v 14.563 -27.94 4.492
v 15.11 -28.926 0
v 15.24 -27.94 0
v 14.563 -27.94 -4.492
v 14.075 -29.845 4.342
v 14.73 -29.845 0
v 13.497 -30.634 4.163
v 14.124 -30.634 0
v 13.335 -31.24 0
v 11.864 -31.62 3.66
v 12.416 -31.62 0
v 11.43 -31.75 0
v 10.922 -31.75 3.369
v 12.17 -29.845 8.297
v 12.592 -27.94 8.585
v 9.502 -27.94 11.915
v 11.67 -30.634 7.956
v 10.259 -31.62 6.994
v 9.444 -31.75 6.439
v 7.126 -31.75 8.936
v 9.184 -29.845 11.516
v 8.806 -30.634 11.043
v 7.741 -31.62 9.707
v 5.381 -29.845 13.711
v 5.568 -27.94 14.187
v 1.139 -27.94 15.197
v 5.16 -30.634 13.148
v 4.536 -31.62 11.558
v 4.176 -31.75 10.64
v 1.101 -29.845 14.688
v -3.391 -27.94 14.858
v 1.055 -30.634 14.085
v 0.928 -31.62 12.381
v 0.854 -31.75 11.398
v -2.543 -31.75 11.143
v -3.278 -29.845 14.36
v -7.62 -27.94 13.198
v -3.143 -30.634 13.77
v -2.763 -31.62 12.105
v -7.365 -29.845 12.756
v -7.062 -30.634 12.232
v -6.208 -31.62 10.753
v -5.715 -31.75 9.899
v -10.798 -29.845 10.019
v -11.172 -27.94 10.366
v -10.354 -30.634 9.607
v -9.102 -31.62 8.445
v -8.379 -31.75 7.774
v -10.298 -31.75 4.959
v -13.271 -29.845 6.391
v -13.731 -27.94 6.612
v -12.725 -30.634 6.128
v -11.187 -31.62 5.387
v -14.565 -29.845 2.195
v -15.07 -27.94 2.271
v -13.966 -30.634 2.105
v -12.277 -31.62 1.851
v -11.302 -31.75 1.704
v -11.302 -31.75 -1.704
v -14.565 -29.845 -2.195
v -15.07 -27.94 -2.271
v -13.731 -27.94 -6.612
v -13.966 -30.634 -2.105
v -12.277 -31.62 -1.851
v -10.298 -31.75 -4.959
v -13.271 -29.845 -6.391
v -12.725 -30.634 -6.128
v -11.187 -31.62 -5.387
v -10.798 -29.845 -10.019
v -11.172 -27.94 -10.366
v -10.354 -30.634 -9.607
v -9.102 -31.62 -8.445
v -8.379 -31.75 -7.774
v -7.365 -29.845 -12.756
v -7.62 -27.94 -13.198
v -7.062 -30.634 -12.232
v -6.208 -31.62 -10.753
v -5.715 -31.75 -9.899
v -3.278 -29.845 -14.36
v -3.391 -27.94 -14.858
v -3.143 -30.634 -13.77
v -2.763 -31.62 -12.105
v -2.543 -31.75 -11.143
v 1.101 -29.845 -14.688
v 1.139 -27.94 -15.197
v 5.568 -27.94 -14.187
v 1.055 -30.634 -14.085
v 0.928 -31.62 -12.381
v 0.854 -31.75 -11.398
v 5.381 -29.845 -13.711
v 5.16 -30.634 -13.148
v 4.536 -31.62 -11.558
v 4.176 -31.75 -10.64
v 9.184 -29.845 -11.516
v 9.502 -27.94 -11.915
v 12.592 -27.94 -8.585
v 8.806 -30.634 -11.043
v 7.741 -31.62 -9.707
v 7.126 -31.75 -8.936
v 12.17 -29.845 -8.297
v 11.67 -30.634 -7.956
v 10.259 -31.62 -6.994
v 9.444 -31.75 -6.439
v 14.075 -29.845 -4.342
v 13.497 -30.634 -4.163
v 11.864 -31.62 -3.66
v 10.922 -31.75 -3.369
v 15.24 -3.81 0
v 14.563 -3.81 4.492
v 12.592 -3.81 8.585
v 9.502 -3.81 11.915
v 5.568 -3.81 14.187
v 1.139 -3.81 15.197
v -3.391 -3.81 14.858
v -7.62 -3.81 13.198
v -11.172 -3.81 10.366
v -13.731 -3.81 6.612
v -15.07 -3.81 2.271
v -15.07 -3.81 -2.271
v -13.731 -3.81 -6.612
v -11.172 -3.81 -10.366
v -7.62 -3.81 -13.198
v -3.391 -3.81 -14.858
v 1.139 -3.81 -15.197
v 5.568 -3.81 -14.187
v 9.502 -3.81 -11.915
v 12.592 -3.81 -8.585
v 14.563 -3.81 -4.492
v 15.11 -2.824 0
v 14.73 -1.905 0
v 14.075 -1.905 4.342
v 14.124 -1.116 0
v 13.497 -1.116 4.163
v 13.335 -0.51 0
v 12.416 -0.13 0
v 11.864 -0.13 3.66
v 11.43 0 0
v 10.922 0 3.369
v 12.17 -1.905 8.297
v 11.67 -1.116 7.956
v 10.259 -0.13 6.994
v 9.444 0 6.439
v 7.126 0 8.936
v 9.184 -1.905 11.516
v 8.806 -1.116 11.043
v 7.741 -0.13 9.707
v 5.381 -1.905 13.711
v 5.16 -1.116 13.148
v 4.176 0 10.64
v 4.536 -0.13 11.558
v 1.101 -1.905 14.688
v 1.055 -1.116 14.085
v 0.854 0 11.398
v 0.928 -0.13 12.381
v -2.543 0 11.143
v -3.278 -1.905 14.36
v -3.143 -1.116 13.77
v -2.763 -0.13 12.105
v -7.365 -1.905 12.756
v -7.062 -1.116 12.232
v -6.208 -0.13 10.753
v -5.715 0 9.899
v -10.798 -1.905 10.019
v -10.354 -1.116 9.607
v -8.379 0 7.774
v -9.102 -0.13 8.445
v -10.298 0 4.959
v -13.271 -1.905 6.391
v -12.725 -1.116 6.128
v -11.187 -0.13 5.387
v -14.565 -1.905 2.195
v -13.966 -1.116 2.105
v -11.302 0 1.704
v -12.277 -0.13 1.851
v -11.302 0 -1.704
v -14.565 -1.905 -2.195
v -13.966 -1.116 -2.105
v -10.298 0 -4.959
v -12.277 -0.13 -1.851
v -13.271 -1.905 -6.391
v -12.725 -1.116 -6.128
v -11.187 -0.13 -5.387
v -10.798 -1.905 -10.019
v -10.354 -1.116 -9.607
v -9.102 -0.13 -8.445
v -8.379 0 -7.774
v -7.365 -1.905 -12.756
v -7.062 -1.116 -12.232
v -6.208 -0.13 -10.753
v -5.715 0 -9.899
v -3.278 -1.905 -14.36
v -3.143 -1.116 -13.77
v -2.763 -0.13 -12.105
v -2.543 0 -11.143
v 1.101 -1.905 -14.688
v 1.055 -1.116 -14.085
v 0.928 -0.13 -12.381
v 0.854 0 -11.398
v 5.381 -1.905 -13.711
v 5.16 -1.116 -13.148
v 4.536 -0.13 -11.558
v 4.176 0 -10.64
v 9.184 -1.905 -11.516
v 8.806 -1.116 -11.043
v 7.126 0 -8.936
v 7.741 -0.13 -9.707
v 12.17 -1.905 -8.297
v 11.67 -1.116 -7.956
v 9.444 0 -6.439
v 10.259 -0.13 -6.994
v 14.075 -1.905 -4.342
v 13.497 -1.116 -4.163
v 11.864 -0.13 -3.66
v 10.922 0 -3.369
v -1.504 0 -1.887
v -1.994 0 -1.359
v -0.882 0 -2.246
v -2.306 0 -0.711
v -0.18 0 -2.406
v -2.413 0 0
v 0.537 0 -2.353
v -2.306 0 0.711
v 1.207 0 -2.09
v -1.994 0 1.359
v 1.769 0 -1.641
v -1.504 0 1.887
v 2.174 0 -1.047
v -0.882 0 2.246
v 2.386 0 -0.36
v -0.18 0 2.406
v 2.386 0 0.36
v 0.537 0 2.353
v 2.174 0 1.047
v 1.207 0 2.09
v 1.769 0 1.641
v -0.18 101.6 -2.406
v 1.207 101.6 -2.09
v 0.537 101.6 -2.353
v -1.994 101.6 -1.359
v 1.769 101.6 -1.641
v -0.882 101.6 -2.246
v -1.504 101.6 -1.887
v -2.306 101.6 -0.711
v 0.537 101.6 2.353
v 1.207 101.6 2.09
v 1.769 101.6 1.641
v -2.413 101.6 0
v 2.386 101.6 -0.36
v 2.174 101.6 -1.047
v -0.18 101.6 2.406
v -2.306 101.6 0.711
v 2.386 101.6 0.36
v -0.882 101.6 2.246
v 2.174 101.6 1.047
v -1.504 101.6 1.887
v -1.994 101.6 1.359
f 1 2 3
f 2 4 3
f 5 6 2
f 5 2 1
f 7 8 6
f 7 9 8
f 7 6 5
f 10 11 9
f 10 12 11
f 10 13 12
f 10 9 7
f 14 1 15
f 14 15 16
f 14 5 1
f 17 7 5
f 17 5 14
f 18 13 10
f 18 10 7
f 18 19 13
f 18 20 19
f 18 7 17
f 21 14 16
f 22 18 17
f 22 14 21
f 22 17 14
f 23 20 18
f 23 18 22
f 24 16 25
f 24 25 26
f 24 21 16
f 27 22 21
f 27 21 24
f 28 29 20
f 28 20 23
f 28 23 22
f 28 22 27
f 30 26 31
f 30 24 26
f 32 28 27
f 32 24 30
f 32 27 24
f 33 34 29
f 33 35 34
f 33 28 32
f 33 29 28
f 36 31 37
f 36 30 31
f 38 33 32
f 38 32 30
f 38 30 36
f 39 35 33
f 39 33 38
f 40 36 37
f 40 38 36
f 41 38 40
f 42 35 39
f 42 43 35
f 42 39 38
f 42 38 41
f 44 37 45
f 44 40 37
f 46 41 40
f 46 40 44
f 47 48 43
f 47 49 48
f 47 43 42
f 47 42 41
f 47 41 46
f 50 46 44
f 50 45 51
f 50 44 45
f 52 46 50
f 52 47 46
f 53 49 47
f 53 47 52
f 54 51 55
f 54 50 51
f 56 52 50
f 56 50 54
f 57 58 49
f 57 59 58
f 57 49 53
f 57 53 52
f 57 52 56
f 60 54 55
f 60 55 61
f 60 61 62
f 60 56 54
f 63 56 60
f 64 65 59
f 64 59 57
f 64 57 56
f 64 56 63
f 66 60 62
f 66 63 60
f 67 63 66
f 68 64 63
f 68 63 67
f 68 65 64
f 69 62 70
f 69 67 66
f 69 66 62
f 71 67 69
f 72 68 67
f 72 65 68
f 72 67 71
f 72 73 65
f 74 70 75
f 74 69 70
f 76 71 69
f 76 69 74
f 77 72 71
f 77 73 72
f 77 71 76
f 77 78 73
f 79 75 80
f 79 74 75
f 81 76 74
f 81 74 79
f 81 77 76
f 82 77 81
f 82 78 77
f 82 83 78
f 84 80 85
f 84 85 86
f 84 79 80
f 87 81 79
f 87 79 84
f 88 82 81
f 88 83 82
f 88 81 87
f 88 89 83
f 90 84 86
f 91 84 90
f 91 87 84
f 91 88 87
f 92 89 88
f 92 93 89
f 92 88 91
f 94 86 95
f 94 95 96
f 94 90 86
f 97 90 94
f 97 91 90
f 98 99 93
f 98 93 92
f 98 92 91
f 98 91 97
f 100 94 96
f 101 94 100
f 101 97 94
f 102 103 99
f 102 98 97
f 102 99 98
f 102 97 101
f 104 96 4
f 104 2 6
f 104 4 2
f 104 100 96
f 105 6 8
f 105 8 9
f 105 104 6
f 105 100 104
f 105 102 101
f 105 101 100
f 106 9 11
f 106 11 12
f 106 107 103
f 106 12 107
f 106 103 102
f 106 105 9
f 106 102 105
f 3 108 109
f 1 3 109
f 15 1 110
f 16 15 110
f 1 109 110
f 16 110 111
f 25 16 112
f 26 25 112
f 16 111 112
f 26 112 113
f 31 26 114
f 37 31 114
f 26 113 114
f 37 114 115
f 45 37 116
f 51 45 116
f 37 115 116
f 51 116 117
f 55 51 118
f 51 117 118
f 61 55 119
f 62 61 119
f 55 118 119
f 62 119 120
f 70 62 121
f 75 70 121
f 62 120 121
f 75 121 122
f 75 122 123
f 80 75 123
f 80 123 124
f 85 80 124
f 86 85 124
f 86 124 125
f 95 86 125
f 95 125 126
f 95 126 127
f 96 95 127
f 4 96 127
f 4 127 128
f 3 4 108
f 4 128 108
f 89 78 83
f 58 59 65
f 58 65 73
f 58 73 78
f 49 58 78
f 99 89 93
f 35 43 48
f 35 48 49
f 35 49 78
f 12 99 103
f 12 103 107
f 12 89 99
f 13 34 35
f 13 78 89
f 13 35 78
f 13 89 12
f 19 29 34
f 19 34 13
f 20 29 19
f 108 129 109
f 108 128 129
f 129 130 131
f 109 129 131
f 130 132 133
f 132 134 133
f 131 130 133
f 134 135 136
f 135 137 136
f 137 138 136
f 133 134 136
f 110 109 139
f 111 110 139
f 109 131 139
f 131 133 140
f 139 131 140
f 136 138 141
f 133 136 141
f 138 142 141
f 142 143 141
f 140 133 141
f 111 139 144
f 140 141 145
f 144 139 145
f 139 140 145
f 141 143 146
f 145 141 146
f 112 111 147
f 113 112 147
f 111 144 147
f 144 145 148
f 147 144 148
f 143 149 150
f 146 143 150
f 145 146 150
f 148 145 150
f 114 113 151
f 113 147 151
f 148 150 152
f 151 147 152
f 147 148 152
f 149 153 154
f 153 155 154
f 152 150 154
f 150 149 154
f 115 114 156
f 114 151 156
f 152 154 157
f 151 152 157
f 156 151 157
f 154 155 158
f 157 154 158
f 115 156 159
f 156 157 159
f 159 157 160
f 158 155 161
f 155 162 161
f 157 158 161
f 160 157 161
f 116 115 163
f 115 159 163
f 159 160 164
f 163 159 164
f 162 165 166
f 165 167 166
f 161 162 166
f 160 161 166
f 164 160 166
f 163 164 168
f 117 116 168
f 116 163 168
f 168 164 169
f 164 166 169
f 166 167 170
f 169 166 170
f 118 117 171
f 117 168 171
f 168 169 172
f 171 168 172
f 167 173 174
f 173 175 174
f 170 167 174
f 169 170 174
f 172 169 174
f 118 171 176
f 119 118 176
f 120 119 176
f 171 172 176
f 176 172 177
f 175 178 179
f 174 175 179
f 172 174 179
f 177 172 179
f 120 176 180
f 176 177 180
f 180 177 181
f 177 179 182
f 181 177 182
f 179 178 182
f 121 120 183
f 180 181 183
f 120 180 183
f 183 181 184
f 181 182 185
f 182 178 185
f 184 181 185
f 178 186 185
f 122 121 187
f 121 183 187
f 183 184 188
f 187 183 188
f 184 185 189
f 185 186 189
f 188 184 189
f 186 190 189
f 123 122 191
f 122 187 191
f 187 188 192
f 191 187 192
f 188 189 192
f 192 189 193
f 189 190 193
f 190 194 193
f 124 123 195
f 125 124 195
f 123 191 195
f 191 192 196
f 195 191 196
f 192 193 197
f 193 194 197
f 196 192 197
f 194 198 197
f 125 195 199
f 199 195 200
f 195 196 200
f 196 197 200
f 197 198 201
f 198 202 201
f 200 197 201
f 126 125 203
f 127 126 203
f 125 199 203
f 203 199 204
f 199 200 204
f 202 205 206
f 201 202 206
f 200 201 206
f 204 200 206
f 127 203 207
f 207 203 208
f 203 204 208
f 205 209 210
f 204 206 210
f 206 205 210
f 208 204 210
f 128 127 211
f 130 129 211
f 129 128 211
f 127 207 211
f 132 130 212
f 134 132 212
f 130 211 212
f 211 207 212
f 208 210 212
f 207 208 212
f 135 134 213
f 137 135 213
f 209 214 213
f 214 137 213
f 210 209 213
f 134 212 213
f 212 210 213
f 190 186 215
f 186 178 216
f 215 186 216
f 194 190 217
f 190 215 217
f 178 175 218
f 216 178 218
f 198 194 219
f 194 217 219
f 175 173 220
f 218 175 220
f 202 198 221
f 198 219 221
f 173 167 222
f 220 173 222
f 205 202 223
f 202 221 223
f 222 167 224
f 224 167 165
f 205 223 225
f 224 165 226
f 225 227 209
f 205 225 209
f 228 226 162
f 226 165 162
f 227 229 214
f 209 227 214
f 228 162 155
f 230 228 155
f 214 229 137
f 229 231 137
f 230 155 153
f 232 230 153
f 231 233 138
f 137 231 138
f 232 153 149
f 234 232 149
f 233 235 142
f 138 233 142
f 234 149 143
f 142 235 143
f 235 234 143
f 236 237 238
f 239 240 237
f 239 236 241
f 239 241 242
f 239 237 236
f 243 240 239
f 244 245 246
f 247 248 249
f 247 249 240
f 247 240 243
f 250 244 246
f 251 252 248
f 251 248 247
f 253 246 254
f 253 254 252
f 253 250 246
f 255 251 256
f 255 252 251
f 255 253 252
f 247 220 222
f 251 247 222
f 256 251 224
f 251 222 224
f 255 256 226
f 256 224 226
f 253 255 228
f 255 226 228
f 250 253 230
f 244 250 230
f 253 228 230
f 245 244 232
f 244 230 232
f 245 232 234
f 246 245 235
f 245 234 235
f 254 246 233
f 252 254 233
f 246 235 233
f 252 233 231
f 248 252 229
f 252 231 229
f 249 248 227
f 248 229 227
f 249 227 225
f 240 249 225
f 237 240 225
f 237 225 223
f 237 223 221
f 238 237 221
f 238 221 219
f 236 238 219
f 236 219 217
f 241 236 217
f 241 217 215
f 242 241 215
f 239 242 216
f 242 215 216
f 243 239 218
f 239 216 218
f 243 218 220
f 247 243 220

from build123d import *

# Parameters (mm, degrees)
F0_R     = 15.24
F1_DEPTH = 31.75
F2_R     = 3.81
F3_R     = 2.413
F4_DEPTH = 101.6


with BuildPart() as f1:
    # F0 (on Front) → F1 (new body)
    with BuildSketch(Plane.XZ):
        Circle(F0_R)
    extrude(amount=F1_DEPTH)

    # F2
    f2_edges = [f1.edges().sort_by_distance(p)[0] for p in [
        (-15.24, -31.75, 0),
        (-15.24, 0, 0),
    ]]
    fillet(f2_edges, radius=F2_R)

    # F3 (on face) → F4 (join)
    with BuildSketch(Plane(origin=(0, 0, 0), x_dir=(-1, 0, 0), z_dir=(0, 1, 0))):
        Circle(F3_R)
    extrude(amount=F4_DEPTH)


solid = f1.part
